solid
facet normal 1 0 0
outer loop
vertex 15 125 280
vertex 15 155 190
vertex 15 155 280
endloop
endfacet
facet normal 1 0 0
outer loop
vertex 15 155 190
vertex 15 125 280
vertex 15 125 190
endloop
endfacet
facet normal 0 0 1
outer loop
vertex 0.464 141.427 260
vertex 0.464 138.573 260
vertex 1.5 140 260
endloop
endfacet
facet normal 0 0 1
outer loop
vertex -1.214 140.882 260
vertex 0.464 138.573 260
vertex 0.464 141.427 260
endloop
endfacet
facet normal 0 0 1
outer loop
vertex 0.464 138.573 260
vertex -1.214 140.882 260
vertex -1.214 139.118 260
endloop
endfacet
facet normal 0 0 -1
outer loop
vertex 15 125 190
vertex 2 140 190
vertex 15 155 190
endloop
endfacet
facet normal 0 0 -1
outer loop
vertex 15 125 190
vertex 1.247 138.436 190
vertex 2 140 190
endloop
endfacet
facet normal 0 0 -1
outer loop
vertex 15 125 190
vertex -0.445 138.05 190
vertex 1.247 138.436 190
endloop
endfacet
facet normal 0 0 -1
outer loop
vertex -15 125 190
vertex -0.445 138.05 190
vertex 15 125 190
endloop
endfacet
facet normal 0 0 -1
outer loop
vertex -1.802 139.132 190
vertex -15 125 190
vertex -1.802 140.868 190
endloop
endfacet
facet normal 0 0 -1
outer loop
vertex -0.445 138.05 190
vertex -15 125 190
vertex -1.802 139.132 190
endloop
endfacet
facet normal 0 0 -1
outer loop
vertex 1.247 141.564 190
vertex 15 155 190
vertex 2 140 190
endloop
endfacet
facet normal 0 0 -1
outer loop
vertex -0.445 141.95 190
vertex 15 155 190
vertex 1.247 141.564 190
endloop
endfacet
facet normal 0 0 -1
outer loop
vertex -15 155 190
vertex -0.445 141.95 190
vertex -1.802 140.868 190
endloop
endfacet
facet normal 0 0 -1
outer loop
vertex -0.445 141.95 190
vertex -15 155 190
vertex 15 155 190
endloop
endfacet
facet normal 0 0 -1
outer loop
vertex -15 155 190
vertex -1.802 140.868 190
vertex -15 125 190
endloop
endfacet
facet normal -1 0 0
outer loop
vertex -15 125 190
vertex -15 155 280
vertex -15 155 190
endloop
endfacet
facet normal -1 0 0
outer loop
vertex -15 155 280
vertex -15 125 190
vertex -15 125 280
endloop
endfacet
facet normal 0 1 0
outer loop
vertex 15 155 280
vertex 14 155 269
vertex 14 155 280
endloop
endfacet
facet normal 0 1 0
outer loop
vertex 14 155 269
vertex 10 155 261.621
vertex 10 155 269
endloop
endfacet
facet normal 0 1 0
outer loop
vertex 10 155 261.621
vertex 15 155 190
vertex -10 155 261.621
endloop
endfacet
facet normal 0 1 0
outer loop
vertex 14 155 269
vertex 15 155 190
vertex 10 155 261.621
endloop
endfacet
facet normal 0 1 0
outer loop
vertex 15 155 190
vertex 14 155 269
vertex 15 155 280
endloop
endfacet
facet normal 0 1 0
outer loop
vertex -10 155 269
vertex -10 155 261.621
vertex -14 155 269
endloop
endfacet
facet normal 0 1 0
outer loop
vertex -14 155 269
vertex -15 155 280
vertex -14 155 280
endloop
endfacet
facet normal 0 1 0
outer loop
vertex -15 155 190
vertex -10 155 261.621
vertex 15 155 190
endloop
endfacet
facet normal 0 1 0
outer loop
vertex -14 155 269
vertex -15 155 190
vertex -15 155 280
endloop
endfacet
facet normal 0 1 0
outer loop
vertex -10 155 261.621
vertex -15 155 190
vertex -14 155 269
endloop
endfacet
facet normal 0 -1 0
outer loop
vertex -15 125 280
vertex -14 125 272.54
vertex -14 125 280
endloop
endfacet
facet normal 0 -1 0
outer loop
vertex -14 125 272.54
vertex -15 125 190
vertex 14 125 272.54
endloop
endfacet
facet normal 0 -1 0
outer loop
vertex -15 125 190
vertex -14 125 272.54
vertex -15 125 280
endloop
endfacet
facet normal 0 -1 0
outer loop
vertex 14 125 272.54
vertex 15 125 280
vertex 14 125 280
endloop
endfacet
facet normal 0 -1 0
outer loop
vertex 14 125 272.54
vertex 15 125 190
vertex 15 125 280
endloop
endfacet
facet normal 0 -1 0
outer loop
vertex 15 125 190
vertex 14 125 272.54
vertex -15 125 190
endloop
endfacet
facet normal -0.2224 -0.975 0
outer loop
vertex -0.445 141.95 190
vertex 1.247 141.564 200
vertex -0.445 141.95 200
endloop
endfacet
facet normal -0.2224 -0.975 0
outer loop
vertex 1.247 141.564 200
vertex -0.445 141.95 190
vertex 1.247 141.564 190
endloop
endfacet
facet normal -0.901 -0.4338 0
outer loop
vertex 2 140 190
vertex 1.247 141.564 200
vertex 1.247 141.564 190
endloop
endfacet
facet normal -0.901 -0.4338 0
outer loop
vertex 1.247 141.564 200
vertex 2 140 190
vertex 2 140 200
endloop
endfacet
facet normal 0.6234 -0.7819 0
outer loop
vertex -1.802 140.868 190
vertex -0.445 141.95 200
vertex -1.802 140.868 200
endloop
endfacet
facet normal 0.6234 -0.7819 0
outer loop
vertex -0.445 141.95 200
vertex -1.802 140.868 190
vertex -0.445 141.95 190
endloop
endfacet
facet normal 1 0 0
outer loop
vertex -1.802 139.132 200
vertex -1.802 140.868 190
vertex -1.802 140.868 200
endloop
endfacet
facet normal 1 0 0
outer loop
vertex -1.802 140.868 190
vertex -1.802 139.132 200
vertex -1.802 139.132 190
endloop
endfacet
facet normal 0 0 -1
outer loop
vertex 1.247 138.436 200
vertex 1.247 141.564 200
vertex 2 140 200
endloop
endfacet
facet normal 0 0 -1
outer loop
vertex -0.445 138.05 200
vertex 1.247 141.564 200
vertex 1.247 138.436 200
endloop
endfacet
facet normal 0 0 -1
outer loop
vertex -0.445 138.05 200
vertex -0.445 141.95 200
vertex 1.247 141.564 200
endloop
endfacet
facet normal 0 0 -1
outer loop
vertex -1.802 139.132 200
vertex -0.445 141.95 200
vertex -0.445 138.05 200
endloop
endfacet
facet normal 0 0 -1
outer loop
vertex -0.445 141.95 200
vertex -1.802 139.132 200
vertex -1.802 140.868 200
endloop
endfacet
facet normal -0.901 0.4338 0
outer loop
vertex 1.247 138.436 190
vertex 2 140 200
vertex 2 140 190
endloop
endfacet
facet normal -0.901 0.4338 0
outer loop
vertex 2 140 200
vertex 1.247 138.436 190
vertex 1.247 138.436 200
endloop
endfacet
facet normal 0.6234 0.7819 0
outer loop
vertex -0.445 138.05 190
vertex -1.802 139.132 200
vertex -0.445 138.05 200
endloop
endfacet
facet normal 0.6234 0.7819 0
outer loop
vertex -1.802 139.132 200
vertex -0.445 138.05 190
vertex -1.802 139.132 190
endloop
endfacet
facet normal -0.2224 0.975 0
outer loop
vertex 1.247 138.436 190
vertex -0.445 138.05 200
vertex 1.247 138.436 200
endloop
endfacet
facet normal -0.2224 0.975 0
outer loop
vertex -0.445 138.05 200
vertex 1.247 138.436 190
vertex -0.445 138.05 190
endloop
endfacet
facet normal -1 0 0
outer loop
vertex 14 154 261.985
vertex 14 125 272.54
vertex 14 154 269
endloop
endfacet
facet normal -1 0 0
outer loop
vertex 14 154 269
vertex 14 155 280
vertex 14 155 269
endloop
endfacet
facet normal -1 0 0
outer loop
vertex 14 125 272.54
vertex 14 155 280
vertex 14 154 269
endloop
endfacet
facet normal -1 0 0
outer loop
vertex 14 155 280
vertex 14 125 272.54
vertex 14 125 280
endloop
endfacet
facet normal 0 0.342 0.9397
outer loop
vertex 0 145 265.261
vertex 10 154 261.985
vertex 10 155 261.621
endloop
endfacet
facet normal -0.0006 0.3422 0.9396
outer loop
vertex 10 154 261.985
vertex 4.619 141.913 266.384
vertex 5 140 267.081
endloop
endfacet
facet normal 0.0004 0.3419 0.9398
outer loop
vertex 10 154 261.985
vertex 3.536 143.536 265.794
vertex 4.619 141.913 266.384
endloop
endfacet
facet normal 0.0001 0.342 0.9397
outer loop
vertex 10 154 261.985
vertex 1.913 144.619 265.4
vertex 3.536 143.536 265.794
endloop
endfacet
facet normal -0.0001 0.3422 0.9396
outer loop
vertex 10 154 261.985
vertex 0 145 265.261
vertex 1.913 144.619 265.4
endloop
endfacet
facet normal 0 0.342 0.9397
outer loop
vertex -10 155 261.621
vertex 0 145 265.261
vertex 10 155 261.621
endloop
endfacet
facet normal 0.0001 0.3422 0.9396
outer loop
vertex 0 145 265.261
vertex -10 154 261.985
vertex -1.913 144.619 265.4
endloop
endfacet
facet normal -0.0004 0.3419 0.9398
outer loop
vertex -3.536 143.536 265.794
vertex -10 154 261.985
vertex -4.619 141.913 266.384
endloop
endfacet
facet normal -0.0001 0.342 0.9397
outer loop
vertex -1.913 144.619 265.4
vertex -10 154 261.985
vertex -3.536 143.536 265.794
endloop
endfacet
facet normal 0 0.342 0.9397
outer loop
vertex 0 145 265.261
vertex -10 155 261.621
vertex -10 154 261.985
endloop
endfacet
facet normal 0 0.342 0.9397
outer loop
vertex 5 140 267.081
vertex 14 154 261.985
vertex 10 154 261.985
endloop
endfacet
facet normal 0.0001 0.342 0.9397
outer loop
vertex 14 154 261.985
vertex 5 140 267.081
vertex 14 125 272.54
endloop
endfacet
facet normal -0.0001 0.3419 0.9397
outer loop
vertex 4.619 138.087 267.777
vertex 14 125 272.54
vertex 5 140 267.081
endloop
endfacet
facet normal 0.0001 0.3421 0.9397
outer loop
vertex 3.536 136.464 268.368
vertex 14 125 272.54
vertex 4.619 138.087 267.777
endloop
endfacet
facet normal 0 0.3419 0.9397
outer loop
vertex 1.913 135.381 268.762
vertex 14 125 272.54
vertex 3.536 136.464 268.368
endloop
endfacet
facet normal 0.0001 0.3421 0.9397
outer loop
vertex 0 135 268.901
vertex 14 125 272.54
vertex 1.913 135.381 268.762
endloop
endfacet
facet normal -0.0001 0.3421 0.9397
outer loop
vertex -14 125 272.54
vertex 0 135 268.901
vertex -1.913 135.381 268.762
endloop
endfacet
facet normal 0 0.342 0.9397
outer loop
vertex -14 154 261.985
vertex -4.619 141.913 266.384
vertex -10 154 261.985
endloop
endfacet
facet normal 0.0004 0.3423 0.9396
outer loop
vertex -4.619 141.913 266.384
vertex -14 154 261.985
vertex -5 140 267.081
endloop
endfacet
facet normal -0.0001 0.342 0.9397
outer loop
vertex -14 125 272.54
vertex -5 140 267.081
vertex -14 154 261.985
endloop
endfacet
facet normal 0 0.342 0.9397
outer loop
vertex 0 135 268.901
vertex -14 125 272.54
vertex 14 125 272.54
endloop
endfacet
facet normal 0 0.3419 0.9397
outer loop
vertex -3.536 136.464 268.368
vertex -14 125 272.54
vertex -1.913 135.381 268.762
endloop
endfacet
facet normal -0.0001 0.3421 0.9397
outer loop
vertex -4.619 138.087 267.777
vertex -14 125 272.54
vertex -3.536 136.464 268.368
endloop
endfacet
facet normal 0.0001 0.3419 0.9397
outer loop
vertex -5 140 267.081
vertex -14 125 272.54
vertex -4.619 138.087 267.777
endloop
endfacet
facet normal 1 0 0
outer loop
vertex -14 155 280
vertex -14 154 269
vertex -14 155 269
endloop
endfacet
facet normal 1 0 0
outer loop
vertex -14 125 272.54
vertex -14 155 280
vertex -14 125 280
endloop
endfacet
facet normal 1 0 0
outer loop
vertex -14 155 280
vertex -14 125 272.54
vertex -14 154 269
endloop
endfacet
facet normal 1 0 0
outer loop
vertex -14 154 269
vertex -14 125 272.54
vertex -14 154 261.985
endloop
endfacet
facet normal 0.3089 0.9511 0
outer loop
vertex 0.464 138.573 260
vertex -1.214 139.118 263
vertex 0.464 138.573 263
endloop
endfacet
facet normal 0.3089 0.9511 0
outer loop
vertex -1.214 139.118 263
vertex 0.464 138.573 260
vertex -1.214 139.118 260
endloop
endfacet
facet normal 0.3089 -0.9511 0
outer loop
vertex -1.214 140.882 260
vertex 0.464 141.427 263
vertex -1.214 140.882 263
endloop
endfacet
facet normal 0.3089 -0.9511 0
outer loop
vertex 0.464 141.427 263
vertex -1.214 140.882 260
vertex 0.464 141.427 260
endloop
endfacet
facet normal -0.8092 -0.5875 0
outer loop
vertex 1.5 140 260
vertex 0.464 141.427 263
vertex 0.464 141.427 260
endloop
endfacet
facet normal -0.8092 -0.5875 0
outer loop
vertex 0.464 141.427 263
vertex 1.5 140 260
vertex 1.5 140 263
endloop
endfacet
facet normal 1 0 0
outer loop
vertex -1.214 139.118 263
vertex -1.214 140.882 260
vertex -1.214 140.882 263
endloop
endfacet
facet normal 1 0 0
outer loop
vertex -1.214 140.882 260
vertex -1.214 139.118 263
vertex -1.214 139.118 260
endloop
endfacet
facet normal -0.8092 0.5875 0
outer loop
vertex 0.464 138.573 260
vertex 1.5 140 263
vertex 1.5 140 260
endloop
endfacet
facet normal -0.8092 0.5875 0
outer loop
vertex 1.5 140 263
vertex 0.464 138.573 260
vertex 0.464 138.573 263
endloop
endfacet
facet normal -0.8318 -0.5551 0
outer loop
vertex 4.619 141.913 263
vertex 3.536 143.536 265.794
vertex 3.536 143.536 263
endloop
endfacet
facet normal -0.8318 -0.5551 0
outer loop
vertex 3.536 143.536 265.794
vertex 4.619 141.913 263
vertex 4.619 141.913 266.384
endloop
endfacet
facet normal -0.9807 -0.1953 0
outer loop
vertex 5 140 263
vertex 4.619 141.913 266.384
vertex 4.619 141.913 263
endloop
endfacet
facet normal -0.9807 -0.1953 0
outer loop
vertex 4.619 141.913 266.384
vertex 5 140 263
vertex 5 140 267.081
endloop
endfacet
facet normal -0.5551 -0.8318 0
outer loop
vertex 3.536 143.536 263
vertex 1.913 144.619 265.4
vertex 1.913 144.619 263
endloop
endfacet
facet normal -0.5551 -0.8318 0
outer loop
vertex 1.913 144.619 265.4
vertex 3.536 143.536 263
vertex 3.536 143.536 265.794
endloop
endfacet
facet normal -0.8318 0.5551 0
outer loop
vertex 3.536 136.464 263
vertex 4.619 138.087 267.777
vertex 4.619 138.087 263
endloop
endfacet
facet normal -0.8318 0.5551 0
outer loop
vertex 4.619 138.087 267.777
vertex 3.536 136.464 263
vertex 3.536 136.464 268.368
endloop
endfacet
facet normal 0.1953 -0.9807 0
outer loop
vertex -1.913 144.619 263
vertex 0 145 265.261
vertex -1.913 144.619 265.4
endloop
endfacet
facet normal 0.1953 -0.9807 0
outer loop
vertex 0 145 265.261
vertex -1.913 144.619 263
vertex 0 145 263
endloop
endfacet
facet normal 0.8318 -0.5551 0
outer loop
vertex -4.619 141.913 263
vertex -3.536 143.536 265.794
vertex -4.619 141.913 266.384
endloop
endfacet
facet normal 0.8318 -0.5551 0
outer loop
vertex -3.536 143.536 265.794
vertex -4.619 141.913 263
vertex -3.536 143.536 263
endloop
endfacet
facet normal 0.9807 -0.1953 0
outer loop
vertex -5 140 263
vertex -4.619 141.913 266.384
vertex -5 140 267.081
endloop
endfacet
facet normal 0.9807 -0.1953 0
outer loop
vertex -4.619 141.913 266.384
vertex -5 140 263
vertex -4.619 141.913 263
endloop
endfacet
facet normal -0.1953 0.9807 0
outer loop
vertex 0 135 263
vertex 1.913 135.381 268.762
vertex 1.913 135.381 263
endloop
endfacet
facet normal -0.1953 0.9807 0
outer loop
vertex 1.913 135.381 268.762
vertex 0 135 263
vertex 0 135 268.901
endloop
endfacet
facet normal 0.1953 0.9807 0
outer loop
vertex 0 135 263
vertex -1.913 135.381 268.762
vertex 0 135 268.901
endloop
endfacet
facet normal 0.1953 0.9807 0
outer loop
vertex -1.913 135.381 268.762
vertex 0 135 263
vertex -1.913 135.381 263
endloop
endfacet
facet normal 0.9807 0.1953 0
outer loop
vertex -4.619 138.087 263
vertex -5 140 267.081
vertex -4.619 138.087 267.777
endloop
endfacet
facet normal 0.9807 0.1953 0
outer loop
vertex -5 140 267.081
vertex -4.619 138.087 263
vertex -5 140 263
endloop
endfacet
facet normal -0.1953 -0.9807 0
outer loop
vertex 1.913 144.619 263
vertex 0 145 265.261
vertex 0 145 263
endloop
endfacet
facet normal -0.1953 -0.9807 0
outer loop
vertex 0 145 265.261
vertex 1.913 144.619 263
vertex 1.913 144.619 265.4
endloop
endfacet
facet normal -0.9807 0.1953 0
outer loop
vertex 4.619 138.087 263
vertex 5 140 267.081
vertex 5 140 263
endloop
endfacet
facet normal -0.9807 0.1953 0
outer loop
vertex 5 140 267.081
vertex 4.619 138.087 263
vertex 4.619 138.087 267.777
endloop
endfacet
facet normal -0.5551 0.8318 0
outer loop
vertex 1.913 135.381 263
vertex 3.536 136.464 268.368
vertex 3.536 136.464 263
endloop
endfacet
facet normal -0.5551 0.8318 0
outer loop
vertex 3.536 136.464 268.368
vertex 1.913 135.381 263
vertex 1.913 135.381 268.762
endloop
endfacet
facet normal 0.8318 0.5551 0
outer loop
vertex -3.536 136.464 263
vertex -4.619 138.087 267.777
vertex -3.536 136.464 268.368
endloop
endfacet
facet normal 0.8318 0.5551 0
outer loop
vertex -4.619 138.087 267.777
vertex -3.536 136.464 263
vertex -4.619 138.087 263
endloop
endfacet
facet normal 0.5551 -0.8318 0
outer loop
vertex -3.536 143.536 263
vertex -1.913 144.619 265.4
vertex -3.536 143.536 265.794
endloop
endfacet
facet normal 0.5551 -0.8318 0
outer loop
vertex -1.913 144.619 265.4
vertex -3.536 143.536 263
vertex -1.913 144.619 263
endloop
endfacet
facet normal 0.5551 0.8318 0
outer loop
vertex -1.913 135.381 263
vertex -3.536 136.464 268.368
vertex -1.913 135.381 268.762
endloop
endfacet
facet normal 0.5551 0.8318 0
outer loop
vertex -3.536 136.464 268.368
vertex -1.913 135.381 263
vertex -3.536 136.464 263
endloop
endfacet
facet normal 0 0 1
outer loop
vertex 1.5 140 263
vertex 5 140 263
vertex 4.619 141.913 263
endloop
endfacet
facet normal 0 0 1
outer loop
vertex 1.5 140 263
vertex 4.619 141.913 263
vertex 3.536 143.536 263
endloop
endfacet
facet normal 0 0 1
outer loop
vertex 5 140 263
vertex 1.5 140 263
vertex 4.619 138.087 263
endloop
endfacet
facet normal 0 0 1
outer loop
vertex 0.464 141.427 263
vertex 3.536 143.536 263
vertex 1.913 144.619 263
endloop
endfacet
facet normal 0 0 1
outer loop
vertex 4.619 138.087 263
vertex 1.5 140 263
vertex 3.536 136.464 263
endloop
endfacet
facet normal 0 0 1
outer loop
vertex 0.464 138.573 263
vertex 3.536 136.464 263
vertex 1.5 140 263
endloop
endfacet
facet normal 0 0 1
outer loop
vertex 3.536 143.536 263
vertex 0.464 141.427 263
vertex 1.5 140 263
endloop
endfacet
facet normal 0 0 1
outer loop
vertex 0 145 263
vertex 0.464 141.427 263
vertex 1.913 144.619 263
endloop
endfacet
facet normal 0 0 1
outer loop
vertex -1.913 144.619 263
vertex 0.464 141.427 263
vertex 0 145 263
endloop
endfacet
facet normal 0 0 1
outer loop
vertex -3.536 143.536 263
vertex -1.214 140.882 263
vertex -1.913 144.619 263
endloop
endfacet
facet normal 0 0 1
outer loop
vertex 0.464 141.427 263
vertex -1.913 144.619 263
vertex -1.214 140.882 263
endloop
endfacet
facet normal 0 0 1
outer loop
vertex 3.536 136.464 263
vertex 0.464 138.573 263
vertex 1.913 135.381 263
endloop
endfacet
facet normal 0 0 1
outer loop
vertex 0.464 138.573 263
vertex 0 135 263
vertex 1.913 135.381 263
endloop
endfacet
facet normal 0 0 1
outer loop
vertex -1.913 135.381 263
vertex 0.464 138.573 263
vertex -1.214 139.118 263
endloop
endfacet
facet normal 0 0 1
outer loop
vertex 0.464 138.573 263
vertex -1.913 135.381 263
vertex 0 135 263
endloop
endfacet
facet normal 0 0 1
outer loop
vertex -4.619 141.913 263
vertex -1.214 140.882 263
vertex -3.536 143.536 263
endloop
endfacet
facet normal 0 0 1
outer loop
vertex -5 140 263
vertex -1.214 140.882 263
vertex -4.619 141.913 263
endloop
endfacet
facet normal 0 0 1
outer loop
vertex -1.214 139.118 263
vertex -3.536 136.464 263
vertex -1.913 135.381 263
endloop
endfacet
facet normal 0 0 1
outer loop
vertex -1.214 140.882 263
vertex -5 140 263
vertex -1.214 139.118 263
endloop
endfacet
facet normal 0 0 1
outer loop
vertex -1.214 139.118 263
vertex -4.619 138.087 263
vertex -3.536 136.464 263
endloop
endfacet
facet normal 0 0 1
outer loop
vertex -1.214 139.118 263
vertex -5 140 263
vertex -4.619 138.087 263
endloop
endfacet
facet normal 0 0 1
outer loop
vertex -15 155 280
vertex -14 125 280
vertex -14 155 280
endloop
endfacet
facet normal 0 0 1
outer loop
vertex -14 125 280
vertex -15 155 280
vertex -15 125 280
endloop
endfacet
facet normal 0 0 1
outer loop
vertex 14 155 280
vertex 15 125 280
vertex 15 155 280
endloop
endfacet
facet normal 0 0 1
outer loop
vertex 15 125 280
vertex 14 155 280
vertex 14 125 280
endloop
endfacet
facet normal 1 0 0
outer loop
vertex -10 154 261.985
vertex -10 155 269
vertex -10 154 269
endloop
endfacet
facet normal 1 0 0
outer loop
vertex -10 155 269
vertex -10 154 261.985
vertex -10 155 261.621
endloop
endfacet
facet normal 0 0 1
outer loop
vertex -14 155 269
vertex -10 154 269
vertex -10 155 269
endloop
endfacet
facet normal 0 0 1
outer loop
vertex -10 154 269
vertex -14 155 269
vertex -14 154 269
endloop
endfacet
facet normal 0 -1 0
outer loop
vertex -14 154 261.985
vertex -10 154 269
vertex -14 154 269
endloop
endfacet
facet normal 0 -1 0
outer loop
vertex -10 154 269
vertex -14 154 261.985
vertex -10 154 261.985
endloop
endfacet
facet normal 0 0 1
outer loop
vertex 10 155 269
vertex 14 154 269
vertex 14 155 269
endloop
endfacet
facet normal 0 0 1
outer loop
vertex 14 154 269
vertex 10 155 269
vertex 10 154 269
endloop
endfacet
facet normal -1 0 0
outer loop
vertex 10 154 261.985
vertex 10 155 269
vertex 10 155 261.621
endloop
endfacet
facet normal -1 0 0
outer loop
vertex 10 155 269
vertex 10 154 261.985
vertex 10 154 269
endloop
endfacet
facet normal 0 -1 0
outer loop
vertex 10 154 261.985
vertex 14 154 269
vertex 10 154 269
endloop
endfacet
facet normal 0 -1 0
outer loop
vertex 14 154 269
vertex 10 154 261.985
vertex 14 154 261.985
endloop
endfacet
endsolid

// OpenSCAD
module bolt_holes() {
    // top front cover
    translate([0,53.5,156.5]) rotate([0,90,0]) cylinder(100, 1.2, 1.2, true);

    // top back cover
    translate([0,147.5,156.5]) rotate([0,90,0]) cylinder(100, 1.2, 1.2, true);

    // front cover
    translate([0,44.5,38.5]) rotate([0,90,0]) cylinder(100, 1.2, 1.2, true);
    translate([0,44.5,156.5]) rotate([0,90,0]) cylinder(100, 1.2, 1.2, true);

    // back cover
    translate([0,156.5,3.5]) rotate([0,90,0]) cylinder(100, 1.2, 1.2, true);
    translate([0,156.5,156.5]) rotate([0,90,0]) cylinder(100, 1.2, 1.2, true);

    // bottom rail
    translate([0,153.5,12.7]) rotate([0,90,0]) cylinder(100, 1.2, 1.2, true);
    translate([0,88.5,7.7]) rotate([0,90,0]) cylinder(100, 1.2, 1.2, true);

    // middle bottom rail
    translate([0,46.5,49.7]) rotate([0,90,0]) cylinder(100, 1.2, 1.2, true);
    translate([0,111.5,44.7]) rotate([0,90,0]) cylinder(100, 1.2, 1.2, true);

    // middle top rail
    translate([0,153.5,93.7]) rotate([0,90,0]) cylinder(100, 1.2, 1.2, true);
    translate([0,88.5,88.7]) rotate([0,90,0]) cylinder(100, 1.2, 1.2, true);

    // top rail
    translate([0,46.5,136.7]) rotate([0,90,0]) cylinder(100, 1.2, 1.2, true);
    translate([0,111.5,131.7]) rotate([0,90,0]) cylinder(100, 1.2, 1.2, true);


    // camera holder
    translate([-13,0,147]) rotate([0,90,90]) cylinder(100, 1.2, 1.2, true);
    translate([13,0,147]) rotate([0,90,90]) cylinder(100, 1.2, 1.2, true);
    translate([-15,0,210]) rotate([0,90,90]) cylinder(100, 1.2, 1.2, true);
    translate([15,0,210]) rotate([0,90,90]) cylinder(100, 1.2, 1.2, true);
}

module left_cover() {
    difference() {
        union() {
            translate([76/2,100,80]) rotate([0,90,0]) cube([160,120,1], true);
            translate([76/2-0.5,-20,0]) cube([1,65,40]);
        }
        bolt_holes();
    }
}

module right_cover() {
    difference() {
        union() {
            translate([-76/2,100,80]) rotate([0,90,0]) cube([160,120,1], true);
            translate([-76/2-0.5,-20,0]) cube([1,65,40]);
        }
        bolt_holes();
    }
}

module top_front_cover() {
    difference() {
        union() {
            translate([0,60,160.5]) cube([77,40,1], true);
            translate([-75/2,50,153]) cube([75,7,7]);
        }
        bolt_holes();
    }
}

module top_back_cover() {
    difference() {
        union() {
            translate([0,140,160.5]) cube([77,40,1], true);
            translate([-75/2,144,153]) cube([75,7,7]);
        }
        bolt_holes();
    }
}

module front_cover() {
    difference() {
        union() {
            translate([0,41,(160 - 35)/2 + 35]) rotate([90,0,0]) cube([75,160-35,2], true);
            translate([-75/2,41,35]) cube([75,7,7]);
            translate([-75/2,41,153]) cube([75,7,7]);
        }
        bolt_holes();
    }
}

module back_cover() {
    difference() {
        union() {
            translate([0,160-1,160/2]) rotate([90,0,0]) cube([75,160,2], true);
            translate([-75/2,153,0]) cube([75,7,7]);
            translate([-75/2,153,153]) cube([75,7,7]);
        }
        bolt_holes();
    }
}

module bottom_rail() {
    difference() {
        union() {
            translate([-75/2,-20,1]) rotate([5,0,0]) cube([75,179,1]);
            translate([-75/2,150,9.2]) rotate([5,0,0]) cube([75,7,7]);
            translate([-75/2,85,4.2]) rotate([5,0,0]) cube([75,7,7]);
        }
        bolt_holes();
    }
}

module middle_bottom_rail() {
    difference() {
        union() {
            translate([-75/2,42,53]) rotate([-5,0,0]) cube([75,85,1]);
            translate([-75/2,43,46.2]) rotate([-5,0,0]) cube([75,7,7]);
            translate([-75/2,108,41.2]) rotate([-5,0,0]) cube([75,7,7]);
        }
        bolt_holes();
    }
}

module middle_top_rail() {
    difference() {
        union() {
            translate([-75/2,73,90]) rotate([5,0,0]) cube([75,85,1]);
            translate([-75/2,150,90.2]) rotate([5,0,0]) cube([75,7,7]);
            translate([-75/2,85,85.2]) rotate([5,0,0]) cube([75,7,7]);
        }
        bolt_holes();
    }
}

module top_rail() {
    difference() {
        union() {
            translate([-75/2,42,140]) rotate([-5,0,0]) cube([75,85,1]);
            translate([-75/2,43,133.2]) rotate([-5,0,0]) cube([75,7,7]);
            translate([-75/2,108,128.2]) rotate([-5,0,0]) cube([75,7,7]);
        }
        bolt_holes();
    }
}

module camera_holder() {
    difference() {
        translate([-25,40,140]) rotate([90,0,0]) cube([50,80,3]);
        bolt_holes();
    }
}

module working_area() {
    translate([-90,-180,0]) cube([180, 20, 15]);
    translate([-90,-180,0]) cube([20, 180, 15]);
    translate([90-20,-180,0]) cube([20, 180, 15]);
    translate([-90,-20,0]) cube([51.5, 20, 15]);
    translate([90-51.5,-20,0]) cube([51.5, 20, 15]);
    translate([-90,-26,0]) cube([26,26,15]);
    translate([90-26,-180,0]) cube([26,26,15]);
    translate([90-26,-26,0]) cube([26,26,15]);
    translate([-90,-180,0]) cube([26,26,15]);
}

module bottle_stand() {
    difference() {
        union() {
            cube([30,30,5], true);
            translate([0,0,10]) cube([10,10,20], true);
        }
        $fn=180; cylinder(100,2.5,2.5, true);
    }
}

module simple_rail() {
    translate([-76/2,140,35]) rotate([0,90,0]) cube([70,40,1], true);
    translate([-76/2-0.5,-20,0]) cube([1,140,40]);
    translate([76/2,140,35]) rotate([0,90,0]) cube([70,40,1], true);
    translate([76/2-0.5,-20,0]) cube([1,140,40]);
    difference() {
        translate([-75/2,-20,-20]) rotate([5,0,0]) cube([75,184,20]);
        union() {
            translate([-75/2,-30,-20])  cube([75,200,20]);
            translate([-75/2,160,0])  cube([75,200,20]);
        }
    }
    difference() {
        translate([-75/2,120,60]) cube([75,40,10]);
        union() {
            translate([25,140,0]) cylinder(100,1.5,1.5);
            translate([-25,140,0]) cylinder(100,1.5,1.5);
        }
    }
}
module camera_stand_base() {
    difference() {
        union() {
            translate([-75/2,120,70]) cube([75,40,5]);
            translate([-15,125,75]) cube([30,30,185]);
        }
        union() {
            translate([25,140,0]) cylinder(100,1.5,1.5);
            translate([-25,140,0]) cylinder(100,1.5,1.5);
            translate([0,140,250]) cylinder(100,1.5,1.5);
        }
    }
}
module camera_angle() {
    difference() {
        union() {
            translate([-15,125,260]) cube([30,30,20]);
            //translate([-15,155,260]) cube([30,5,2]);
        }
        union() {
            translate([-14,110,278]) rotate([-20,0,0]) cube([28,55,40]);
            translate([0,140,250]) cylinder(100,1.5,1.5);
            translate([0,140,263]) cylinder(100,5,5);
        }
    }
    translate([-15,154,261]) cube([5,1,8]);
    translate([10,154,261]) cube([5,1,8]);
}

module camera_tripod_stand() {
    difference() {
        translate([-15,125,190]) cube([30,30,70]);
        translate([0,140,190]) cylinder(10,2,2);
    }
    camera_angle();
}

//simple_rail();
//camera_stand_base();
//camera_angle();
camera_tripod_stand();
//translate([-14,100,271]) rotate([-20,0,0]) cube([28,55,40]);
// left_cover();
// right_cover();
// top_front_cover();
// top_back_cover();
// front_cover();
// back_cover();
// top_rail();
// middle_top_rail();
// middle_bottom_rail();
// bottom_rail();
// working_area();
// camera_holder();
// bottle_stand();
